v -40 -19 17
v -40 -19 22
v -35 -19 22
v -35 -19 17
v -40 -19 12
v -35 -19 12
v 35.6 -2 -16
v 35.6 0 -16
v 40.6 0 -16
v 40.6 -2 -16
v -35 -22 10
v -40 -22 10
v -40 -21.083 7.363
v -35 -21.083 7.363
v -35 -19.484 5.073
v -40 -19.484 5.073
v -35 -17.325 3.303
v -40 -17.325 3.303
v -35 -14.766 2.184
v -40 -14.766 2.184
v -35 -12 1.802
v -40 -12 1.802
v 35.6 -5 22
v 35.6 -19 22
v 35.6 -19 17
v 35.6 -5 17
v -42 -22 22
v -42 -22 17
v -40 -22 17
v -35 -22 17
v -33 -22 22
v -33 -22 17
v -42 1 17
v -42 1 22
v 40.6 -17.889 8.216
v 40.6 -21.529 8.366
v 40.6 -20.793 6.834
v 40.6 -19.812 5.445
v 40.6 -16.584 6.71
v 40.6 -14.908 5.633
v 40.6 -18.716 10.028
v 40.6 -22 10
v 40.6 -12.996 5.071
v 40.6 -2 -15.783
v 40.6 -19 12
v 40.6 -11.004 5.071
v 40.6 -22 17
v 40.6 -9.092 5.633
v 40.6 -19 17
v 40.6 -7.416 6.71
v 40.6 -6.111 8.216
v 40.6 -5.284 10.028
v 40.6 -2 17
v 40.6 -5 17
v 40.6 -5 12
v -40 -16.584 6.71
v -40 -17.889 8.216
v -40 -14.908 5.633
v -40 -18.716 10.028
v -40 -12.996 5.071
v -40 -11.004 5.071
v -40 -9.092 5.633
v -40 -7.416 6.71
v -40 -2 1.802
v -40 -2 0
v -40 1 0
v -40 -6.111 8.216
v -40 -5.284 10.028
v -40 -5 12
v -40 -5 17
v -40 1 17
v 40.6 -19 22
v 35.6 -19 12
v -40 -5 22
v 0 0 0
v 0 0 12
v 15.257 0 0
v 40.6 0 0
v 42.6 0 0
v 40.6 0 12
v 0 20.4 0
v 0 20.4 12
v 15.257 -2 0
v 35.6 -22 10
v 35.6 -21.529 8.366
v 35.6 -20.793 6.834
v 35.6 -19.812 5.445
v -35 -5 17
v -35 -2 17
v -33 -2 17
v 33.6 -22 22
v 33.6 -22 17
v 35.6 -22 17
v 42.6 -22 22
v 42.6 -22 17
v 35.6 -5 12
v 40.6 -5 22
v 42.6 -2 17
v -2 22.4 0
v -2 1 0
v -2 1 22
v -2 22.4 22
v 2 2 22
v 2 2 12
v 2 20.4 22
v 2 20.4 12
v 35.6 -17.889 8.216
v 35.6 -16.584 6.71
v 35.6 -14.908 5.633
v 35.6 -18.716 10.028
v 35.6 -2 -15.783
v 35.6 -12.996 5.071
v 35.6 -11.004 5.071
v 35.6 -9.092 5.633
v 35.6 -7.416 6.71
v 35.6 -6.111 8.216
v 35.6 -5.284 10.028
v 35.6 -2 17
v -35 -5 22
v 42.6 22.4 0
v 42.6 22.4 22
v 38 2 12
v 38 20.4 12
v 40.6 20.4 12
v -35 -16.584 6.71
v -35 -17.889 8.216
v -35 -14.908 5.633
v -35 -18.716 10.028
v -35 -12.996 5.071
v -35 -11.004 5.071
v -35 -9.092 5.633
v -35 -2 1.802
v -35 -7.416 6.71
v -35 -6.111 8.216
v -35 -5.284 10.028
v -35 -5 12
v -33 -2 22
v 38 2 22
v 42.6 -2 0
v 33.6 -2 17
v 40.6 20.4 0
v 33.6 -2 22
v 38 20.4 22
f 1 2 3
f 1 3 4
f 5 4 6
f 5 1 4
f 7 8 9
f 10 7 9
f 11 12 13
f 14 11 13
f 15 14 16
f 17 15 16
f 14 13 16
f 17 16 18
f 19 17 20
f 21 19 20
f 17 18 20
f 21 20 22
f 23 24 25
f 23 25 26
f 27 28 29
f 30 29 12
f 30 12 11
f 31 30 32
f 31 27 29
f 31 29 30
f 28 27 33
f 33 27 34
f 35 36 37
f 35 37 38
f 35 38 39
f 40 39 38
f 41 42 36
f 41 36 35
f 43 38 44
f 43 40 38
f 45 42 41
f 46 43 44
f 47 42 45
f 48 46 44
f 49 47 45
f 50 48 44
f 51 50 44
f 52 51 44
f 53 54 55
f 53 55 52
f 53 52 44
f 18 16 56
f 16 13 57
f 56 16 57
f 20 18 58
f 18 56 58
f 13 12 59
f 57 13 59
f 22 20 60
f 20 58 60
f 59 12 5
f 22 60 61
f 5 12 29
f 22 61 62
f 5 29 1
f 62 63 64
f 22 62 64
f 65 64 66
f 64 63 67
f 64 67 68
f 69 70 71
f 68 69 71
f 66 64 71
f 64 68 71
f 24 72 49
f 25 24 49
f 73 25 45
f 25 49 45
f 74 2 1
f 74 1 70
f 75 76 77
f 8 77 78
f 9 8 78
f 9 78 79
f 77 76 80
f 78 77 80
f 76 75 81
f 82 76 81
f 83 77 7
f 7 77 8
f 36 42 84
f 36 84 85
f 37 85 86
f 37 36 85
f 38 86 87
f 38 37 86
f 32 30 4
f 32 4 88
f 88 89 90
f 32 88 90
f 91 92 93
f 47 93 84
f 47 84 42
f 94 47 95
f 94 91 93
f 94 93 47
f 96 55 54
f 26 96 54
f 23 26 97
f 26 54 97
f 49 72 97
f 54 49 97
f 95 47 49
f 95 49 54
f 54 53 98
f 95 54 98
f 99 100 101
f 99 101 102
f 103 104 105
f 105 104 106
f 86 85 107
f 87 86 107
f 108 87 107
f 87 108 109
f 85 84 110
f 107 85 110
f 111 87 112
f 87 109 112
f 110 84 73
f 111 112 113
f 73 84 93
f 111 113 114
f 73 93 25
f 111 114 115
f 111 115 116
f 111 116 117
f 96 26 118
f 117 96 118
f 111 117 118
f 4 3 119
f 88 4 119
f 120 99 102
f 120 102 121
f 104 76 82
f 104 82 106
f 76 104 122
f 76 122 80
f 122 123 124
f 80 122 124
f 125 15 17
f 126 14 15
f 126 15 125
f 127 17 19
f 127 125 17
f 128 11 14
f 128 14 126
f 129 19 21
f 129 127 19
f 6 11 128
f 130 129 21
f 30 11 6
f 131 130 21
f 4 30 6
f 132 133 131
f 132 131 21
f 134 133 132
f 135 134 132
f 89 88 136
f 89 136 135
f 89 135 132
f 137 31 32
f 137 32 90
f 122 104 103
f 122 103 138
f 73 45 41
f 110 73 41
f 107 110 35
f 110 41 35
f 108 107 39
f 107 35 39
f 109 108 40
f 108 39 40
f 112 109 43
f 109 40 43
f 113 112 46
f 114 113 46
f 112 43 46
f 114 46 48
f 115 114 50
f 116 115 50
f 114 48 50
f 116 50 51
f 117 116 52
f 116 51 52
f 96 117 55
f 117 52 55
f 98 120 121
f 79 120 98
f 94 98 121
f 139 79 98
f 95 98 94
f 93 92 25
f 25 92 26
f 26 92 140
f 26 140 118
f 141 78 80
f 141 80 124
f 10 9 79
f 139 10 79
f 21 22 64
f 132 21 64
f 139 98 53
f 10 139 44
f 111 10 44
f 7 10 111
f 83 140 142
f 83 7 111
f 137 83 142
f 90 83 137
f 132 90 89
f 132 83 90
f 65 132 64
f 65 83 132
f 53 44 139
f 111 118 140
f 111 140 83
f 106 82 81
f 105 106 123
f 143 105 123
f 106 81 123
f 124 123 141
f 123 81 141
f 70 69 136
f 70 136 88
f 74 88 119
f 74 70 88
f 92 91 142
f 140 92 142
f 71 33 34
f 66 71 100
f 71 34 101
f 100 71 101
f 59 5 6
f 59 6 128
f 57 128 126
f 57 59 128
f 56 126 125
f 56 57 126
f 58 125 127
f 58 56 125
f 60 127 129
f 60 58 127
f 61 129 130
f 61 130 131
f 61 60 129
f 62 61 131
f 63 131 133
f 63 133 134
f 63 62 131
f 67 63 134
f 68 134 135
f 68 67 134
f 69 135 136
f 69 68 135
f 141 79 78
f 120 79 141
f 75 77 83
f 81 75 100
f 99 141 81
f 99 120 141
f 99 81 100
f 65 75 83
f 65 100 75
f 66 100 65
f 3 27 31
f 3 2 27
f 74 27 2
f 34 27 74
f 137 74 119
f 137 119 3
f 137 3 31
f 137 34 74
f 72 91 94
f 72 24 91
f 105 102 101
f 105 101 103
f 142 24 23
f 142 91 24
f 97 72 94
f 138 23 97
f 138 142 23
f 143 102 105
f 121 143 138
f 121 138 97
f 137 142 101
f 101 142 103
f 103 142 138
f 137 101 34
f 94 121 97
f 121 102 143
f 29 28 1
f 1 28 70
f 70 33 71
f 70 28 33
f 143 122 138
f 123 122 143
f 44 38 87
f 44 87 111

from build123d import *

# Parameters (mm, degrees)
SKETCH014_W   = 40.6
SKETCH014_H   = 20.4
PAD013_DEPTH  = 22
PAD014_DEPTH  = 2
PAD012_DEPTH  = 5
SKETCH016_W   = 9
SKETCH016_H   = 22
SKETCH016_W_2 = 5
SKETCH016_H_2 = 17
PAD015_DEPTH  = 5
SKETCH017_W   = 44.6
SKETCH017_H   = 24.4
SKETCH017_W_2 = 36
SKETCH017_H_2 = 18.4
PAD016_DEPTH  = 10
PAD017_DEPTH  = 5
SKETCH019_W   = 9
SKETCH019_H   = 23
SKETCH019_W_2 = 5
SKETCH019_H_2 = 17
PAD018_DEPTH  = 5


with BuildPart() as part:
    # Sketch014 → Pad013 (new body)
    with BuildSketch(Plane.XY):
        Polygon((-2, 22.4), (42.6, 22.4), (42.6, -2), (-40, -2), (-40, 1), (-2, 1), align=None)
        with Locations((20.3, 10.2)):
            Rectangle(SKETCH014_W, SKETCH014_H, mode=Mode.SUBTRACT)
    extrude(amount=PAD013_DEPTH)

    # Sketch015 → Pad014 (join)
    with BuildSketch(Plane.XZ):
        Polygon((0, 12), (35.6, -16), (40.6, -16), (42.6, 0), (42.6, 12), align=None)
    extrude(amount=PAD014_DEPTH)

    # Sketch013 → Pad012 (join)
    with BuildSketch(Plane(origin=(40.6, 0, 10), x_dir=(0, 1, 0), z_dir=(1, 0, 0))):
        with BuildLine():
            Line((-22, 12), (-22, 0))
            ThreePointArc((-22, 0), (-21.192692, -2.415248), (-19.812151, -4.555173))
            Line((-19.812151, -4.555173), (-2, -25.782868))
            Line((-2, -25.782868), (-2, 2))
            Line((-2, 12), (-2, 2))
            Line((-5, 12), (-2, 12))
            Line((-5, 2), (-5, 12))
            ThreePointArc((-19, 2), (-12, -5), (-5, 2))
            Line((-19, 12), (-19, 2))
            Line((-22, 12), (-19, 12))
        make_face()
    extrude(amount=-PAD012_DEPTH)

    # Sketch016 → Pad015 (join)
    with BuildSketch(Plane(origin=(35.6, 0, 22), x_dir=(1, 0, 0), z_dir=(0, 0, 1))):
        with Locations((2.5, -11)):
            Rectangle(SKETCH016_W, SKETCH016_H)
        with Locations((2.5, -10.5)):
            Rectangle(SKETCH016_W_2, SKETCH016_H_2, mode=Mode.SUBTRACT)
    extrude(amount=-PAD015_DEPTH)

    # Sketch017 → Pad016 (join)
    with BuildSketch(Plane.XY.offset(12)):
        with Locations((20.3, 10.2)):
            Rectangle(SKETCH017_W, SKETCH017_H)
        with Locations((20, 11.2)):
            Rectangle(SKETCH017_W_2, SKETCH017_H_2, mode=Mode.SUBTRACT)
    extrude(amount=PAD016_DEPTH)

    # Sketch018 → Pad017 (join)
    with BuildSketch(Plane(origin=(-40, 0, 10), x_dir=(0, 1, 0), z_dir=(1, 0, 0))):
        with BuildLine():
            Line((-22, 12), (-22, 0))
            ThreePointArc((-22, 0), (-18.465444, -5.886573), (-12, -8.198039))
            Line((-12, -8.198039), (-2, -8.198039))
            Line((-2, -8.198039), (-2, 2))
            Line((-2, 12), (-2, 2))
            Line((-5, 12), (-2, 12))
            Line((-5, 2), (-5, 12))
            ThreePointArc((-19, 2), (-12, -5), (-5, 2))
            Line((-19, 12), (-19, 2))
            Line((-22, 12), (-19, 12))
        make_face()
    extrude(amount=PAD017_DEPTH)

    # Sketch019 → Pad018 (join)
    with BuildSketch(Plane(origin=(-40, 0, 22), x_dir=(1, 0, 0), z_dir=(0, 0, 1))):
        with Locations((2.5, -10.5)):
            Rectangle(SKETCH019_W, SKETCH019_H)
        with Locations((2.5, -10.5)):
            Rectangle(SKETCH019_W_2, SKETCH019_H_2, mode=Mode.SUBTRACT)
    extrude(amount=-PAD018_DEPTH)


solid = part.part
